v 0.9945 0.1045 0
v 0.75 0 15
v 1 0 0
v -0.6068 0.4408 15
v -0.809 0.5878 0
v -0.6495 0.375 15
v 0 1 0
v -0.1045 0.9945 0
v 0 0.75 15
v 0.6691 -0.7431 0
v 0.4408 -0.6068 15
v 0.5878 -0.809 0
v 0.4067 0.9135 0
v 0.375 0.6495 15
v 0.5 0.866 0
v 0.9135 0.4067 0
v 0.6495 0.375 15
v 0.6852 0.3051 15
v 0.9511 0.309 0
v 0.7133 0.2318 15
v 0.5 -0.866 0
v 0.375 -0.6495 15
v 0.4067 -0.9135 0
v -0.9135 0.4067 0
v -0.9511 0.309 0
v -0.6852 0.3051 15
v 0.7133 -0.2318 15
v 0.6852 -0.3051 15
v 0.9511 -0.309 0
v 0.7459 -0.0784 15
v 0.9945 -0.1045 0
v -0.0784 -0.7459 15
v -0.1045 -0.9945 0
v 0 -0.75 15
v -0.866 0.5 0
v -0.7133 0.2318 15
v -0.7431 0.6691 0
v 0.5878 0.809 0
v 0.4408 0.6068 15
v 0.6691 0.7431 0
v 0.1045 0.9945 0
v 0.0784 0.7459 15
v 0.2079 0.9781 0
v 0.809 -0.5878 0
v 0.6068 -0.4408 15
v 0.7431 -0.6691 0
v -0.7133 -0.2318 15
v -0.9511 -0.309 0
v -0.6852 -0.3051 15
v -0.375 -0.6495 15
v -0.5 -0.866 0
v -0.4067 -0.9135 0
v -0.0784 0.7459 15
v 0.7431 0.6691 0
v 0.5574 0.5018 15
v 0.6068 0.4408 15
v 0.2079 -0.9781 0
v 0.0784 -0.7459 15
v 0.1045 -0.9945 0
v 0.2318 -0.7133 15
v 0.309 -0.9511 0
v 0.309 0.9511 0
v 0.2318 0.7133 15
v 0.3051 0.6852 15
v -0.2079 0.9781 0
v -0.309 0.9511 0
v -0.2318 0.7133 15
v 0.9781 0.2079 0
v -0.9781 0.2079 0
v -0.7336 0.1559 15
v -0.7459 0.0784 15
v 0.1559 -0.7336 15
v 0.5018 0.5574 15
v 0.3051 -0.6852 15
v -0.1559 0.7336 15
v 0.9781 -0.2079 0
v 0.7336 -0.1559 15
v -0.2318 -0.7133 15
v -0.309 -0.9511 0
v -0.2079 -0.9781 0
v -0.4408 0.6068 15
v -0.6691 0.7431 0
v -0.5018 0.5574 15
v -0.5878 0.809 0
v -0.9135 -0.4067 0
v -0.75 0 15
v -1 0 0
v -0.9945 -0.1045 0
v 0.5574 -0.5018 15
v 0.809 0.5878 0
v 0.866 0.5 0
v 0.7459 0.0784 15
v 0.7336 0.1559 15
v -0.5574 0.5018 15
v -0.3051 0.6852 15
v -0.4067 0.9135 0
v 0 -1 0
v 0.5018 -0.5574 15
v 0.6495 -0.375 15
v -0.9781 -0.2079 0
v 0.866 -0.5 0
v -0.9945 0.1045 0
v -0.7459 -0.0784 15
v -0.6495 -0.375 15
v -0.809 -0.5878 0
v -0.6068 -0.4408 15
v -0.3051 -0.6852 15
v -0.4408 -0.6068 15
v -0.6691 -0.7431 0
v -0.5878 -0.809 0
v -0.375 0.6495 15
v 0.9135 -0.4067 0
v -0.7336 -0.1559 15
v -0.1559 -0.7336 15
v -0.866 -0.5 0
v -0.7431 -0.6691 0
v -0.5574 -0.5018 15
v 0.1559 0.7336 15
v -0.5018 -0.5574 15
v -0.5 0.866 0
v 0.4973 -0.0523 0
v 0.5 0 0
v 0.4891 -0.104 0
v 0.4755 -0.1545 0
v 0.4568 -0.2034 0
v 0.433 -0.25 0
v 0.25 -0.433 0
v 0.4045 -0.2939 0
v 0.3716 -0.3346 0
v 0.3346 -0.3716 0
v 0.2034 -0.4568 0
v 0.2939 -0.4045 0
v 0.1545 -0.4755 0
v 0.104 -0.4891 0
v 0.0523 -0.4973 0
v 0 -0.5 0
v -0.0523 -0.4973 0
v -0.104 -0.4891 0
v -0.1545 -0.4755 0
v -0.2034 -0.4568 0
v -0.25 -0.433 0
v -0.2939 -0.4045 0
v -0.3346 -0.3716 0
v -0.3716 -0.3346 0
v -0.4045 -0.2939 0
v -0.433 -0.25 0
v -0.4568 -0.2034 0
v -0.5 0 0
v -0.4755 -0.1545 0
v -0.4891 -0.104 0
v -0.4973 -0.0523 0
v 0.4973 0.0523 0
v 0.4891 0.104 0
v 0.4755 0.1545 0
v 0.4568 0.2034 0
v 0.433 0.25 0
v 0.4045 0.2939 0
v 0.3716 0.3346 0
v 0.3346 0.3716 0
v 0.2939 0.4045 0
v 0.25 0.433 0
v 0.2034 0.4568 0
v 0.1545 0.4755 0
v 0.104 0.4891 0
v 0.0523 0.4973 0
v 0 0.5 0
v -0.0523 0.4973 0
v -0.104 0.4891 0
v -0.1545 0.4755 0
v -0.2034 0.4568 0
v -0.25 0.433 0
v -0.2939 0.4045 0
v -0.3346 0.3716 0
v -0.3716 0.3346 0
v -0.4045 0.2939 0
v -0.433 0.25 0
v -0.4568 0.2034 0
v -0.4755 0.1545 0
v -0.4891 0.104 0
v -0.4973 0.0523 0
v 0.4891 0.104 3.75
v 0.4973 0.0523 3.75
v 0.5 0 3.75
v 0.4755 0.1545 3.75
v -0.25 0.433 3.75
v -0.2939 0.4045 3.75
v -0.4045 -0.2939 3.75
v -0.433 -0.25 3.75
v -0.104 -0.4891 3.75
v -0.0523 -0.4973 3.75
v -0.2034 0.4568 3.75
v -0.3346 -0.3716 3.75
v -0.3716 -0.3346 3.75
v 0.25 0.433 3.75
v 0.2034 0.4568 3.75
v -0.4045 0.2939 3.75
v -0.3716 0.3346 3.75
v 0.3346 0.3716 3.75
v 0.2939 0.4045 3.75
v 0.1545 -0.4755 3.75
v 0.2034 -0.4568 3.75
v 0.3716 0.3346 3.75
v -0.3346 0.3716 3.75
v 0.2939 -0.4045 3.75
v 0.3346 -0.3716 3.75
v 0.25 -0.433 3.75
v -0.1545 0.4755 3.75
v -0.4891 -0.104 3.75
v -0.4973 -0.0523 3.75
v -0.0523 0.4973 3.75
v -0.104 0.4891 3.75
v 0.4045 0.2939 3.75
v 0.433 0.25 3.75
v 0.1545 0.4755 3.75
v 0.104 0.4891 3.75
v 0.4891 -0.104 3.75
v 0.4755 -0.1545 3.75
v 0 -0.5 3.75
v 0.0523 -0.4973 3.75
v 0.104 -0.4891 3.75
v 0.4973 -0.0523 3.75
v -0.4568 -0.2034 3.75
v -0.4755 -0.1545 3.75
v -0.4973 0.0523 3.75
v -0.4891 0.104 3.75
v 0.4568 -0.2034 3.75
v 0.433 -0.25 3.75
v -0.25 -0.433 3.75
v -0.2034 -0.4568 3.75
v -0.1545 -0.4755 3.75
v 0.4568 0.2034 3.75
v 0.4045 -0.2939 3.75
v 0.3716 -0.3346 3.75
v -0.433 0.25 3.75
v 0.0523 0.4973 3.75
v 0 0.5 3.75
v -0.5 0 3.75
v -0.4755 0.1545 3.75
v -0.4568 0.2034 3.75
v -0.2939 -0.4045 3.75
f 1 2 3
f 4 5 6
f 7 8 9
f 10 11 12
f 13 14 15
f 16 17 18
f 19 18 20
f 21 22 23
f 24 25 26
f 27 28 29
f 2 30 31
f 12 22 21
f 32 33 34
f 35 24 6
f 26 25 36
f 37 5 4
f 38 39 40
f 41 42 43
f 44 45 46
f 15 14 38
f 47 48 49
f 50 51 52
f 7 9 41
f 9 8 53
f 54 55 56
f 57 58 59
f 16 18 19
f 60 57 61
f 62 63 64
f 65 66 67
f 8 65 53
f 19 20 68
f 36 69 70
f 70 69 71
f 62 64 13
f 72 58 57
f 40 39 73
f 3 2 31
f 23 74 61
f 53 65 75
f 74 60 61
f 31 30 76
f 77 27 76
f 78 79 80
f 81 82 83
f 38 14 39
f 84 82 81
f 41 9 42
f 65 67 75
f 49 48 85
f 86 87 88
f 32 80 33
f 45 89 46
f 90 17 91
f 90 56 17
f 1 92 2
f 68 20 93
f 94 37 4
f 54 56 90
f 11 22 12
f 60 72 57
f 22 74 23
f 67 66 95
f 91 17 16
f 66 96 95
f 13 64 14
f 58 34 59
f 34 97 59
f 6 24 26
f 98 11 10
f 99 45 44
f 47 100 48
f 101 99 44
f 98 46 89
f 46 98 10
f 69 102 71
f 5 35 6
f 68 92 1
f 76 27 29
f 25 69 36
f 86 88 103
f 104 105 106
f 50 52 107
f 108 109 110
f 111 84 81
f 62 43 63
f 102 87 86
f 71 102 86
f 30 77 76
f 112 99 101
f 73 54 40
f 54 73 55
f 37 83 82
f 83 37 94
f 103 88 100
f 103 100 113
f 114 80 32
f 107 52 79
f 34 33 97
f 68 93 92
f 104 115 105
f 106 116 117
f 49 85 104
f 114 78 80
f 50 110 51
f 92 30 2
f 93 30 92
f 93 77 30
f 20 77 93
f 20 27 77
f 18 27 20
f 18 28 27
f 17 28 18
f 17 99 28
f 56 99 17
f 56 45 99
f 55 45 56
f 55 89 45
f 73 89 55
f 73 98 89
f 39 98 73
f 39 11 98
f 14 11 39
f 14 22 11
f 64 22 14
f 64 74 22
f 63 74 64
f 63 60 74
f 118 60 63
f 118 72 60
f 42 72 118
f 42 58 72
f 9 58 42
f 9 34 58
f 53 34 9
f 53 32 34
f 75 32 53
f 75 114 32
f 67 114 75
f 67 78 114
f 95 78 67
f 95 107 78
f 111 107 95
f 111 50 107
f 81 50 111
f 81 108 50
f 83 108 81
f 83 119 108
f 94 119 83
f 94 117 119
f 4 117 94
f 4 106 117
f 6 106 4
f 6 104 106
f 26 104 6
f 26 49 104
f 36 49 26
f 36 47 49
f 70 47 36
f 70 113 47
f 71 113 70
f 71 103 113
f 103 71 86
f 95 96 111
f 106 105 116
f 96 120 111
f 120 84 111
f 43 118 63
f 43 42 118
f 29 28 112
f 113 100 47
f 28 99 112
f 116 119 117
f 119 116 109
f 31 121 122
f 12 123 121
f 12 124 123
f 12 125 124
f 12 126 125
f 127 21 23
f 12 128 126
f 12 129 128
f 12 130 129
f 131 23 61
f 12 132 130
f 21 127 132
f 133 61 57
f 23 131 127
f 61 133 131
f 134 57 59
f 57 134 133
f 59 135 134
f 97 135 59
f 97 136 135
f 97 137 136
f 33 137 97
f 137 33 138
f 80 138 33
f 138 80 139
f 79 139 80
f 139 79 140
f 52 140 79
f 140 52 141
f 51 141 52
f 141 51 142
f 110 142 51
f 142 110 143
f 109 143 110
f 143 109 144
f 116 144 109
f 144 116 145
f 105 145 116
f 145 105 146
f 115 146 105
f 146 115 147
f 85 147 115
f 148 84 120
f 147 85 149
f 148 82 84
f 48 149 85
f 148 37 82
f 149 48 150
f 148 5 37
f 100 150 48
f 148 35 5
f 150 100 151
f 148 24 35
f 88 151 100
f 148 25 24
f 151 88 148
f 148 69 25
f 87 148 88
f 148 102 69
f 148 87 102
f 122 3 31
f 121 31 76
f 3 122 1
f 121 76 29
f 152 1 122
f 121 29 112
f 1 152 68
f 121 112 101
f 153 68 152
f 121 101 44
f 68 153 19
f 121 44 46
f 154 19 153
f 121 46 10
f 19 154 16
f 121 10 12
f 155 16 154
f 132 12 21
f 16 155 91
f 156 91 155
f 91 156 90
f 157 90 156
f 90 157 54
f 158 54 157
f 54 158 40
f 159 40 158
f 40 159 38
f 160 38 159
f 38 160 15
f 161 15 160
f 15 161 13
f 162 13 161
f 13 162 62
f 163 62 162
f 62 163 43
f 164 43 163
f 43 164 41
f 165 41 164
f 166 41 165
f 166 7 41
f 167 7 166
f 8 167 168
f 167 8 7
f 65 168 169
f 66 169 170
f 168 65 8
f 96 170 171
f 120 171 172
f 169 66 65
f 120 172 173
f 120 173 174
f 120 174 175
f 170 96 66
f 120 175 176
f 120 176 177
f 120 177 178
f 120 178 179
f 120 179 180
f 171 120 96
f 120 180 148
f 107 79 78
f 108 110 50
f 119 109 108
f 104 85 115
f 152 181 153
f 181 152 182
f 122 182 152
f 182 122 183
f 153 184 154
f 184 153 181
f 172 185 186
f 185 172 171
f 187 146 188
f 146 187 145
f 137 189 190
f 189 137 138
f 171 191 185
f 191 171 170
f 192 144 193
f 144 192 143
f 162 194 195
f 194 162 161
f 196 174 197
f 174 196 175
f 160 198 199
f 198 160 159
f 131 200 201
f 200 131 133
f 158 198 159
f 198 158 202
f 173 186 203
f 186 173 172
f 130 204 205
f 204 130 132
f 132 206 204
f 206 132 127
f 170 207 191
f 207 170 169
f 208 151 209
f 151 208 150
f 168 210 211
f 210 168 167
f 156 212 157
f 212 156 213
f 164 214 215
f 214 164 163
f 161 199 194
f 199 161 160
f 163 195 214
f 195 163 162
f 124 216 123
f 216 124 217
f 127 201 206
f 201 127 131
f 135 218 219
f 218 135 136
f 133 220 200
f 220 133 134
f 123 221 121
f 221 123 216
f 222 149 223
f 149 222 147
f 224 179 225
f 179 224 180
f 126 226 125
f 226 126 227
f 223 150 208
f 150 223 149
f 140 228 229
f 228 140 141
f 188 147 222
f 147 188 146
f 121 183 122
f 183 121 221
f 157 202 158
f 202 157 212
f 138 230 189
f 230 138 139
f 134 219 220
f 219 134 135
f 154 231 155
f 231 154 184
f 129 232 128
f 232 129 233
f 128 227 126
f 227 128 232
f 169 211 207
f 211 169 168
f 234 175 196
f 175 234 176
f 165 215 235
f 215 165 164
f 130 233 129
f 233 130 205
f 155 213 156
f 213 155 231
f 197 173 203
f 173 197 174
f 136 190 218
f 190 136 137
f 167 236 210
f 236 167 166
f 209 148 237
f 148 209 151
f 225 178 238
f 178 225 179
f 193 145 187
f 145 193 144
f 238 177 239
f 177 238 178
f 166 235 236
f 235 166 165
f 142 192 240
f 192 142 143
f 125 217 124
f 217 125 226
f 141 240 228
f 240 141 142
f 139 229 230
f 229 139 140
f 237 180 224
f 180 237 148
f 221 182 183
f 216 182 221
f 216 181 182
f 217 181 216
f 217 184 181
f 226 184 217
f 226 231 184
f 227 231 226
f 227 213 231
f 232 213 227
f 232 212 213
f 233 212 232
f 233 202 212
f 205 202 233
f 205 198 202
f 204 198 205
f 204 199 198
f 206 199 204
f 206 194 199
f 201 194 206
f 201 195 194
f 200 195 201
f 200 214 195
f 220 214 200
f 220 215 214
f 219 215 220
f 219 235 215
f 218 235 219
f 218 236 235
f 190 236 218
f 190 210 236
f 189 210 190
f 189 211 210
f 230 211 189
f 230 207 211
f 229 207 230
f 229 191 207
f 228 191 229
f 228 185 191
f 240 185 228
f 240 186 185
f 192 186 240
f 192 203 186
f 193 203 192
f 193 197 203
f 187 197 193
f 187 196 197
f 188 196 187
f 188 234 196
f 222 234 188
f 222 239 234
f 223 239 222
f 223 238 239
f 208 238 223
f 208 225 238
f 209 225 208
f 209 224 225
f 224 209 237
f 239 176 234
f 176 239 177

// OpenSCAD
$fn=60 ;
module mastHead(height,baseDiam,topDiam,socketDiam){
    difference(){
        cylinder(r1=baseDiam/2, r2=topDiam/2,h=height);
        cylinder(r1=socketDiam, r2=socketDiam,h=height/4);

    }
}

mastHead(15,2,1.5,1/2) ;
